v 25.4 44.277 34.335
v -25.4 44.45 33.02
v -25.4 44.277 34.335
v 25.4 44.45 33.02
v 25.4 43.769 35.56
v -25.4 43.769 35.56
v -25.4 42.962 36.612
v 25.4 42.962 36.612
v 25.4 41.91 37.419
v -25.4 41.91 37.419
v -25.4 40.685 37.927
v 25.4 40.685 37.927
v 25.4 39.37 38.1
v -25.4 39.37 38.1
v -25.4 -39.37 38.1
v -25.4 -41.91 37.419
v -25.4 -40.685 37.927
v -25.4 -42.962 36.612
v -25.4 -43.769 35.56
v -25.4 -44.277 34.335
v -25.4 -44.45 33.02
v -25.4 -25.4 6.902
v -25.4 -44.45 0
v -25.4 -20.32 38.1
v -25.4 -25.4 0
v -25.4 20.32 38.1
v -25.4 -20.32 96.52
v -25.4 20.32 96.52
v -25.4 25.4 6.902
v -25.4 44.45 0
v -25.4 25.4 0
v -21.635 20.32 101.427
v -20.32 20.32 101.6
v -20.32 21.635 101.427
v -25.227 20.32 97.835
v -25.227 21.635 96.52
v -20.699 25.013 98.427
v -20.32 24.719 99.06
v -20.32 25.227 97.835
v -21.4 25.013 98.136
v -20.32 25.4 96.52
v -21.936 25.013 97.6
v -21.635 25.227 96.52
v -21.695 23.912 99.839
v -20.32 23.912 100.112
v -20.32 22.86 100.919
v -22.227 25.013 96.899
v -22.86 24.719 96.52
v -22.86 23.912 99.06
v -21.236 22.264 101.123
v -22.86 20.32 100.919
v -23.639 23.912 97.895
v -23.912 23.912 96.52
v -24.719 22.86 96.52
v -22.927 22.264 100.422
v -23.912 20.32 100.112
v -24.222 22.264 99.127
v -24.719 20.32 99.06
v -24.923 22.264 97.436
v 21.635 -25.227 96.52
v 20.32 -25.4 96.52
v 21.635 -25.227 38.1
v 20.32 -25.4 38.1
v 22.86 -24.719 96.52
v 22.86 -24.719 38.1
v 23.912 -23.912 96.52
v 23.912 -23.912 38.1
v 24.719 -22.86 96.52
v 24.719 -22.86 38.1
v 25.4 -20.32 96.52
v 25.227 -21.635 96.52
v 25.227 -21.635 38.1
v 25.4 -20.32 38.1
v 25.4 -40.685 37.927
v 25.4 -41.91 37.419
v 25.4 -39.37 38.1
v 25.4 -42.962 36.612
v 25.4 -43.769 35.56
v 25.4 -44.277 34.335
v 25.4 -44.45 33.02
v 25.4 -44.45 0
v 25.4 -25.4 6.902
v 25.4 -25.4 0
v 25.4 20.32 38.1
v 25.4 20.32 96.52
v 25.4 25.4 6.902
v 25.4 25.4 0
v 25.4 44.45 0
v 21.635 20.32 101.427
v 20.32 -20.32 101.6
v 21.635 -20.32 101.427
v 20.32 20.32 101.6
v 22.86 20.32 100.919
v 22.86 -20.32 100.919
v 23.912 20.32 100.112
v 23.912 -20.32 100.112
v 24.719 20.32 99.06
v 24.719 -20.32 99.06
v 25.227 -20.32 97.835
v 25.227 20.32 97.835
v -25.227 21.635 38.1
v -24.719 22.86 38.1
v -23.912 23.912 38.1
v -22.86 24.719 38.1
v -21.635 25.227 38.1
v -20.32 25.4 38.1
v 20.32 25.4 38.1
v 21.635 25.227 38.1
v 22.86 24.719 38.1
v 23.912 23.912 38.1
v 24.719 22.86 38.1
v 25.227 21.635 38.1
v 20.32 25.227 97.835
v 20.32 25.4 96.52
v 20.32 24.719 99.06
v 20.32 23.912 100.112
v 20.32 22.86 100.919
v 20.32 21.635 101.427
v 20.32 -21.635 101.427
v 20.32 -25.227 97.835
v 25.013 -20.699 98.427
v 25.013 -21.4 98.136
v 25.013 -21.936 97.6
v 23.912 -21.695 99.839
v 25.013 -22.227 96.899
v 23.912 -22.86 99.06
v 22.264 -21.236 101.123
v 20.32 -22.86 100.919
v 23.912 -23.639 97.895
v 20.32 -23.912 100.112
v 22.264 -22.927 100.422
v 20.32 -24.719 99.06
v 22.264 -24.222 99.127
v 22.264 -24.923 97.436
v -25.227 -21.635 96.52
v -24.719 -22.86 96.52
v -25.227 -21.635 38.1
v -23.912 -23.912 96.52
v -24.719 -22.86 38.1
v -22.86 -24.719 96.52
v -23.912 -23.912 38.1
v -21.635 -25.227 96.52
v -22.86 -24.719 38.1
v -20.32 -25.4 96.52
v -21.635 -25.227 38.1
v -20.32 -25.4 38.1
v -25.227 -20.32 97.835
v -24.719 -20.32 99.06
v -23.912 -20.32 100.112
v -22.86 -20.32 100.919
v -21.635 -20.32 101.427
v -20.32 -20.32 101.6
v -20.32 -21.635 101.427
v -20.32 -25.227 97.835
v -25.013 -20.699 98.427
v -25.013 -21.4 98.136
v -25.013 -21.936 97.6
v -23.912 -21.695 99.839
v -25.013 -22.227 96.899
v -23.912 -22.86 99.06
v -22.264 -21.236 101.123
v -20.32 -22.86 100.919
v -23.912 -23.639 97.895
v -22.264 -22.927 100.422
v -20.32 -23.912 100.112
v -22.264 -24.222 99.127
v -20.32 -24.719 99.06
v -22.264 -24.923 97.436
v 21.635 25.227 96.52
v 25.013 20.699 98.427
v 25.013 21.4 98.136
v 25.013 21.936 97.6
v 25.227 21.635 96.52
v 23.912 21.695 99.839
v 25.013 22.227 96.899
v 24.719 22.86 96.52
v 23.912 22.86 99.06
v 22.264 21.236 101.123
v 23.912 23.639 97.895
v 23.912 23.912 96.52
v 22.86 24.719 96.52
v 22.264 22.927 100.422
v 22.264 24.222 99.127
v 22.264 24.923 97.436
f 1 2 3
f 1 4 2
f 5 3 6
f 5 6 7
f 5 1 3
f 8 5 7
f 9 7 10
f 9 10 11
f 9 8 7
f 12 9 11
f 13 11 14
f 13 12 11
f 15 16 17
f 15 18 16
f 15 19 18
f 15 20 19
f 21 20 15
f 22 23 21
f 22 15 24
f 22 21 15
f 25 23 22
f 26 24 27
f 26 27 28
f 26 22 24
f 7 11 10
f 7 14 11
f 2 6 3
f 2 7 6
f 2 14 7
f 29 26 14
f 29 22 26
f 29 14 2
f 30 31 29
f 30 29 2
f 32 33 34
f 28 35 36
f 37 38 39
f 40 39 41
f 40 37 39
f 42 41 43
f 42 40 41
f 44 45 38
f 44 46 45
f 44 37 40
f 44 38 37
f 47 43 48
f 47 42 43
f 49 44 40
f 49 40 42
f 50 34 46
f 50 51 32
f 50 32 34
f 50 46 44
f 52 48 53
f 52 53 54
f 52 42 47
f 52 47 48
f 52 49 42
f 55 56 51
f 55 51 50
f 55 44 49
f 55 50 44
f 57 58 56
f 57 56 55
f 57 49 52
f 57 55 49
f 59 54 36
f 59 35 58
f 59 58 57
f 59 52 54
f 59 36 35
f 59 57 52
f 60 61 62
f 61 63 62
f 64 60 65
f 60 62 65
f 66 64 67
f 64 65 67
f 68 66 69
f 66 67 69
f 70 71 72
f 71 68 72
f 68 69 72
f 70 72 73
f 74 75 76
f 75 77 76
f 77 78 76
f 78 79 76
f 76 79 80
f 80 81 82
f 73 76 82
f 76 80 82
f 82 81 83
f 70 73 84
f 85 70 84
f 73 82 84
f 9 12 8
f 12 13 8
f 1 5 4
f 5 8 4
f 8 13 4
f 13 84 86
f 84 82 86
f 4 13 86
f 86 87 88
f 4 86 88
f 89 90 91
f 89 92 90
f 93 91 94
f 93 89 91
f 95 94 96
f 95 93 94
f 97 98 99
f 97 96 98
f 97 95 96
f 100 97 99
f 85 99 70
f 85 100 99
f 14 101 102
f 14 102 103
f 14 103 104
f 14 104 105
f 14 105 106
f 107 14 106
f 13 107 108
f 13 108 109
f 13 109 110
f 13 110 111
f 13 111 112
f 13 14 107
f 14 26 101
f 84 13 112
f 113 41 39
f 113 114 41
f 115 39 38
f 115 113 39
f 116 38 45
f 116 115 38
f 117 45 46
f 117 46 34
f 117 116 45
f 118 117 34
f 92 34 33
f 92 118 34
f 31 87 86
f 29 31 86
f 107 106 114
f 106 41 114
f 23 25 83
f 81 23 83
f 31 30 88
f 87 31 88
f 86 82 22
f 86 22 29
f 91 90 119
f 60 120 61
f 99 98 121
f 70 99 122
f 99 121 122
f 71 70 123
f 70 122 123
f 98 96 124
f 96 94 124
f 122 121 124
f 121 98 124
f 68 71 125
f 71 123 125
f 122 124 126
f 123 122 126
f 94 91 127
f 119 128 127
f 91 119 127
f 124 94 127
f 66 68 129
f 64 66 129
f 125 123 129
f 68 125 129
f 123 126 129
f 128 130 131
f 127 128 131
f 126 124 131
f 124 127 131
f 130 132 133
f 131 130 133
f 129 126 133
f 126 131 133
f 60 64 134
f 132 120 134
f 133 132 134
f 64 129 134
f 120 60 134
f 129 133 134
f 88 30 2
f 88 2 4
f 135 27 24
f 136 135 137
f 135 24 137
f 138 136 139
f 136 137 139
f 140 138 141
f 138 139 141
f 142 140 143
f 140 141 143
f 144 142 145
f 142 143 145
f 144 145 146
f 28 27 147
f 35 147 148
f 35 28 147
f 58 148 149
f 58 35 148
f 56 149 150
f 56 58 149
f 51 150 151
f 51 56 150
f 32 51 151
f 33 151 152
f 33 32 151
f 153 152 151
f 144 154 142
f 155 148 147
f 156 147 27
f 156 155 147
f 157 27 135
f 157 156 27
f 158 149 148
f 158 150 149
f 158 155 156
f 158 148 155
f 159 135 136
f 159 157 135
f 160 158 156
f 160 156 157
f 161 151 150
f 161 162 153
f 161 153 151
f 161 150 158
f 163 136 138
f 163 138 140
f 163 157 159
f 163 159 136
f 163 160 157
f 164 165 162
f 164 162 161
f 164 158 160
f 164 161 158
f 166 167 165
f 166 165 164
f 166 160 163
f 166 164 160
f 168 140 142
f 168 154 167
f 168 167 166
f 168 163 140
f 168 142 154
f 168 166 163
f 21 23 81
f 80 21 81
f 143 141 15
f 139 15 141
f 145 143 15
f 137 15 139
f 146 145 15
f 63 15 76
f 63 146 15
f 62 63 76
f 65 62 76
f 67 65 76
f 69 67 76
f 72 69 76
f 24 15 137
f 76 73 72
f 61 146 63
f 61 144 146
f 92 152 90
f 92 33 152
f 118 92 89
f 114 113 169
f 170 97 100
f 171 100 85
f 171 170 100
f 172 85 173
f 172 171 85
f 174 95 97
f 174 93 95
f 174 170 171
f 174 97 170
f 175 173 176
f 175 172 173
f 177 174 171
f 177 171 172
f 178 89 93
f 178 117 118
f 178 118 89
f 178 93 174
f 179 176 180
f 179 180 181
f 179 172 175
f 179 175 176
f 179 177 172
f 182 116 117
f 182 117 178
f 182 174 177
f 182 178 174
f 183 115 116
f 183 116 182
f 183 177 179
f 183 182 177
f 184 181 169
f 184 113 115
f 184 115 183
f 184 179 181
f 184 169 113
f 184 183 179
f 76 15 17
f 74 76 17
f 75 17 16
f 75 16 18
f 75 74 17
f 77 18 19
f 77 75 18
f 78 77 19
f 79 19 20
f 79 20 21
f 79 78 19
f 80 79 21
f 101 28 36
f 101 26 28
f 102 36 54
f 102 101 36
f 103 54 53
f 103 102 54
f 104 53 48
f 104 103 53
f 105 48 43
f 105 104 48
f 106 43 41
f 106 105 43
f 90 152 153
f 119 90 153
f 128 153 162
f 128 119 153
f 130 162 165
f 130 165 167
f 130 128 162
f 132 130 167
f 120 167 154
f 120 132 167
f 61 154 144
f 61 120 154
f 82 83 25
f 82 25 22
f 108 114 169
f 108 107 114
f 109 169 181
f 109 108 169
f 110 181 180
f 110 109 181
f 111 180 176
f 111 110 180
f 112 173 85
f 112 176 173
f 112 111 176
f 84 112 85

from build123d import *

# Parameters (mm, degrees)
F0_W     = 50.8
F0_H     = 88.9
F1_DEPTH = 101.6
F2_W     = 50.8
F2_H     = 19.05
F3_DEPTH = 63.5
F4_W     = 50.8
F4_H     = 6.9018518552
F5_DEPTH = 50.8
F6_R     = 5.08


with BuildPart() as f1:
    # F0 (on Top) → F1 (new body)
    with BuildSketch(Plane.XY):
        Rectangle(F0_W, F0_H)
    extrude(amount=F1_DEPTH)

    # F2 (on face) → F3 (cut)
    with BuildSketch(Plane.XY.offset(101.6)):
        with Locations((0, -34.925)):
            Rectangle(F2_W, F2_H)
        with Locations((0, 34.925)):
            Rectangle(F2_W, F2_H)
    extrude(amount=-F3_DEPTH, mode=Mode.SUBTRACT)

    # F4 (on face) → F5 (cut)
    with BuildSketch(Plane.YZ.offset(25.4)):
        with Locations((0, 3.4509259276)):
            Rectangle(F4_W, F4_H)
    extrude(amount=-F5_DEPTH, mode=Mode.SUBTRACT)

    # F6
    f6_edges = [f1.edges().sort_by_distance(p)[0] for p in [
        (0, -25.4, 101.6),
        (-25.4, 0, 101.6),
        (0, 25.4, 101.6),
        (25.4, 0, 101.6),
        (25.4, -25.4, 69.85),
        (25.4, 25.4, 69.85),
        (-25.4, 25.4, 69.85),
        (-25.4, -25.4, 69.85),
        (0, -44.45, 38.1),
        (0, 44.45, 38.1),
    ]]
    fillet(f6_edges, radius=F6_R)


solid = f1.part
